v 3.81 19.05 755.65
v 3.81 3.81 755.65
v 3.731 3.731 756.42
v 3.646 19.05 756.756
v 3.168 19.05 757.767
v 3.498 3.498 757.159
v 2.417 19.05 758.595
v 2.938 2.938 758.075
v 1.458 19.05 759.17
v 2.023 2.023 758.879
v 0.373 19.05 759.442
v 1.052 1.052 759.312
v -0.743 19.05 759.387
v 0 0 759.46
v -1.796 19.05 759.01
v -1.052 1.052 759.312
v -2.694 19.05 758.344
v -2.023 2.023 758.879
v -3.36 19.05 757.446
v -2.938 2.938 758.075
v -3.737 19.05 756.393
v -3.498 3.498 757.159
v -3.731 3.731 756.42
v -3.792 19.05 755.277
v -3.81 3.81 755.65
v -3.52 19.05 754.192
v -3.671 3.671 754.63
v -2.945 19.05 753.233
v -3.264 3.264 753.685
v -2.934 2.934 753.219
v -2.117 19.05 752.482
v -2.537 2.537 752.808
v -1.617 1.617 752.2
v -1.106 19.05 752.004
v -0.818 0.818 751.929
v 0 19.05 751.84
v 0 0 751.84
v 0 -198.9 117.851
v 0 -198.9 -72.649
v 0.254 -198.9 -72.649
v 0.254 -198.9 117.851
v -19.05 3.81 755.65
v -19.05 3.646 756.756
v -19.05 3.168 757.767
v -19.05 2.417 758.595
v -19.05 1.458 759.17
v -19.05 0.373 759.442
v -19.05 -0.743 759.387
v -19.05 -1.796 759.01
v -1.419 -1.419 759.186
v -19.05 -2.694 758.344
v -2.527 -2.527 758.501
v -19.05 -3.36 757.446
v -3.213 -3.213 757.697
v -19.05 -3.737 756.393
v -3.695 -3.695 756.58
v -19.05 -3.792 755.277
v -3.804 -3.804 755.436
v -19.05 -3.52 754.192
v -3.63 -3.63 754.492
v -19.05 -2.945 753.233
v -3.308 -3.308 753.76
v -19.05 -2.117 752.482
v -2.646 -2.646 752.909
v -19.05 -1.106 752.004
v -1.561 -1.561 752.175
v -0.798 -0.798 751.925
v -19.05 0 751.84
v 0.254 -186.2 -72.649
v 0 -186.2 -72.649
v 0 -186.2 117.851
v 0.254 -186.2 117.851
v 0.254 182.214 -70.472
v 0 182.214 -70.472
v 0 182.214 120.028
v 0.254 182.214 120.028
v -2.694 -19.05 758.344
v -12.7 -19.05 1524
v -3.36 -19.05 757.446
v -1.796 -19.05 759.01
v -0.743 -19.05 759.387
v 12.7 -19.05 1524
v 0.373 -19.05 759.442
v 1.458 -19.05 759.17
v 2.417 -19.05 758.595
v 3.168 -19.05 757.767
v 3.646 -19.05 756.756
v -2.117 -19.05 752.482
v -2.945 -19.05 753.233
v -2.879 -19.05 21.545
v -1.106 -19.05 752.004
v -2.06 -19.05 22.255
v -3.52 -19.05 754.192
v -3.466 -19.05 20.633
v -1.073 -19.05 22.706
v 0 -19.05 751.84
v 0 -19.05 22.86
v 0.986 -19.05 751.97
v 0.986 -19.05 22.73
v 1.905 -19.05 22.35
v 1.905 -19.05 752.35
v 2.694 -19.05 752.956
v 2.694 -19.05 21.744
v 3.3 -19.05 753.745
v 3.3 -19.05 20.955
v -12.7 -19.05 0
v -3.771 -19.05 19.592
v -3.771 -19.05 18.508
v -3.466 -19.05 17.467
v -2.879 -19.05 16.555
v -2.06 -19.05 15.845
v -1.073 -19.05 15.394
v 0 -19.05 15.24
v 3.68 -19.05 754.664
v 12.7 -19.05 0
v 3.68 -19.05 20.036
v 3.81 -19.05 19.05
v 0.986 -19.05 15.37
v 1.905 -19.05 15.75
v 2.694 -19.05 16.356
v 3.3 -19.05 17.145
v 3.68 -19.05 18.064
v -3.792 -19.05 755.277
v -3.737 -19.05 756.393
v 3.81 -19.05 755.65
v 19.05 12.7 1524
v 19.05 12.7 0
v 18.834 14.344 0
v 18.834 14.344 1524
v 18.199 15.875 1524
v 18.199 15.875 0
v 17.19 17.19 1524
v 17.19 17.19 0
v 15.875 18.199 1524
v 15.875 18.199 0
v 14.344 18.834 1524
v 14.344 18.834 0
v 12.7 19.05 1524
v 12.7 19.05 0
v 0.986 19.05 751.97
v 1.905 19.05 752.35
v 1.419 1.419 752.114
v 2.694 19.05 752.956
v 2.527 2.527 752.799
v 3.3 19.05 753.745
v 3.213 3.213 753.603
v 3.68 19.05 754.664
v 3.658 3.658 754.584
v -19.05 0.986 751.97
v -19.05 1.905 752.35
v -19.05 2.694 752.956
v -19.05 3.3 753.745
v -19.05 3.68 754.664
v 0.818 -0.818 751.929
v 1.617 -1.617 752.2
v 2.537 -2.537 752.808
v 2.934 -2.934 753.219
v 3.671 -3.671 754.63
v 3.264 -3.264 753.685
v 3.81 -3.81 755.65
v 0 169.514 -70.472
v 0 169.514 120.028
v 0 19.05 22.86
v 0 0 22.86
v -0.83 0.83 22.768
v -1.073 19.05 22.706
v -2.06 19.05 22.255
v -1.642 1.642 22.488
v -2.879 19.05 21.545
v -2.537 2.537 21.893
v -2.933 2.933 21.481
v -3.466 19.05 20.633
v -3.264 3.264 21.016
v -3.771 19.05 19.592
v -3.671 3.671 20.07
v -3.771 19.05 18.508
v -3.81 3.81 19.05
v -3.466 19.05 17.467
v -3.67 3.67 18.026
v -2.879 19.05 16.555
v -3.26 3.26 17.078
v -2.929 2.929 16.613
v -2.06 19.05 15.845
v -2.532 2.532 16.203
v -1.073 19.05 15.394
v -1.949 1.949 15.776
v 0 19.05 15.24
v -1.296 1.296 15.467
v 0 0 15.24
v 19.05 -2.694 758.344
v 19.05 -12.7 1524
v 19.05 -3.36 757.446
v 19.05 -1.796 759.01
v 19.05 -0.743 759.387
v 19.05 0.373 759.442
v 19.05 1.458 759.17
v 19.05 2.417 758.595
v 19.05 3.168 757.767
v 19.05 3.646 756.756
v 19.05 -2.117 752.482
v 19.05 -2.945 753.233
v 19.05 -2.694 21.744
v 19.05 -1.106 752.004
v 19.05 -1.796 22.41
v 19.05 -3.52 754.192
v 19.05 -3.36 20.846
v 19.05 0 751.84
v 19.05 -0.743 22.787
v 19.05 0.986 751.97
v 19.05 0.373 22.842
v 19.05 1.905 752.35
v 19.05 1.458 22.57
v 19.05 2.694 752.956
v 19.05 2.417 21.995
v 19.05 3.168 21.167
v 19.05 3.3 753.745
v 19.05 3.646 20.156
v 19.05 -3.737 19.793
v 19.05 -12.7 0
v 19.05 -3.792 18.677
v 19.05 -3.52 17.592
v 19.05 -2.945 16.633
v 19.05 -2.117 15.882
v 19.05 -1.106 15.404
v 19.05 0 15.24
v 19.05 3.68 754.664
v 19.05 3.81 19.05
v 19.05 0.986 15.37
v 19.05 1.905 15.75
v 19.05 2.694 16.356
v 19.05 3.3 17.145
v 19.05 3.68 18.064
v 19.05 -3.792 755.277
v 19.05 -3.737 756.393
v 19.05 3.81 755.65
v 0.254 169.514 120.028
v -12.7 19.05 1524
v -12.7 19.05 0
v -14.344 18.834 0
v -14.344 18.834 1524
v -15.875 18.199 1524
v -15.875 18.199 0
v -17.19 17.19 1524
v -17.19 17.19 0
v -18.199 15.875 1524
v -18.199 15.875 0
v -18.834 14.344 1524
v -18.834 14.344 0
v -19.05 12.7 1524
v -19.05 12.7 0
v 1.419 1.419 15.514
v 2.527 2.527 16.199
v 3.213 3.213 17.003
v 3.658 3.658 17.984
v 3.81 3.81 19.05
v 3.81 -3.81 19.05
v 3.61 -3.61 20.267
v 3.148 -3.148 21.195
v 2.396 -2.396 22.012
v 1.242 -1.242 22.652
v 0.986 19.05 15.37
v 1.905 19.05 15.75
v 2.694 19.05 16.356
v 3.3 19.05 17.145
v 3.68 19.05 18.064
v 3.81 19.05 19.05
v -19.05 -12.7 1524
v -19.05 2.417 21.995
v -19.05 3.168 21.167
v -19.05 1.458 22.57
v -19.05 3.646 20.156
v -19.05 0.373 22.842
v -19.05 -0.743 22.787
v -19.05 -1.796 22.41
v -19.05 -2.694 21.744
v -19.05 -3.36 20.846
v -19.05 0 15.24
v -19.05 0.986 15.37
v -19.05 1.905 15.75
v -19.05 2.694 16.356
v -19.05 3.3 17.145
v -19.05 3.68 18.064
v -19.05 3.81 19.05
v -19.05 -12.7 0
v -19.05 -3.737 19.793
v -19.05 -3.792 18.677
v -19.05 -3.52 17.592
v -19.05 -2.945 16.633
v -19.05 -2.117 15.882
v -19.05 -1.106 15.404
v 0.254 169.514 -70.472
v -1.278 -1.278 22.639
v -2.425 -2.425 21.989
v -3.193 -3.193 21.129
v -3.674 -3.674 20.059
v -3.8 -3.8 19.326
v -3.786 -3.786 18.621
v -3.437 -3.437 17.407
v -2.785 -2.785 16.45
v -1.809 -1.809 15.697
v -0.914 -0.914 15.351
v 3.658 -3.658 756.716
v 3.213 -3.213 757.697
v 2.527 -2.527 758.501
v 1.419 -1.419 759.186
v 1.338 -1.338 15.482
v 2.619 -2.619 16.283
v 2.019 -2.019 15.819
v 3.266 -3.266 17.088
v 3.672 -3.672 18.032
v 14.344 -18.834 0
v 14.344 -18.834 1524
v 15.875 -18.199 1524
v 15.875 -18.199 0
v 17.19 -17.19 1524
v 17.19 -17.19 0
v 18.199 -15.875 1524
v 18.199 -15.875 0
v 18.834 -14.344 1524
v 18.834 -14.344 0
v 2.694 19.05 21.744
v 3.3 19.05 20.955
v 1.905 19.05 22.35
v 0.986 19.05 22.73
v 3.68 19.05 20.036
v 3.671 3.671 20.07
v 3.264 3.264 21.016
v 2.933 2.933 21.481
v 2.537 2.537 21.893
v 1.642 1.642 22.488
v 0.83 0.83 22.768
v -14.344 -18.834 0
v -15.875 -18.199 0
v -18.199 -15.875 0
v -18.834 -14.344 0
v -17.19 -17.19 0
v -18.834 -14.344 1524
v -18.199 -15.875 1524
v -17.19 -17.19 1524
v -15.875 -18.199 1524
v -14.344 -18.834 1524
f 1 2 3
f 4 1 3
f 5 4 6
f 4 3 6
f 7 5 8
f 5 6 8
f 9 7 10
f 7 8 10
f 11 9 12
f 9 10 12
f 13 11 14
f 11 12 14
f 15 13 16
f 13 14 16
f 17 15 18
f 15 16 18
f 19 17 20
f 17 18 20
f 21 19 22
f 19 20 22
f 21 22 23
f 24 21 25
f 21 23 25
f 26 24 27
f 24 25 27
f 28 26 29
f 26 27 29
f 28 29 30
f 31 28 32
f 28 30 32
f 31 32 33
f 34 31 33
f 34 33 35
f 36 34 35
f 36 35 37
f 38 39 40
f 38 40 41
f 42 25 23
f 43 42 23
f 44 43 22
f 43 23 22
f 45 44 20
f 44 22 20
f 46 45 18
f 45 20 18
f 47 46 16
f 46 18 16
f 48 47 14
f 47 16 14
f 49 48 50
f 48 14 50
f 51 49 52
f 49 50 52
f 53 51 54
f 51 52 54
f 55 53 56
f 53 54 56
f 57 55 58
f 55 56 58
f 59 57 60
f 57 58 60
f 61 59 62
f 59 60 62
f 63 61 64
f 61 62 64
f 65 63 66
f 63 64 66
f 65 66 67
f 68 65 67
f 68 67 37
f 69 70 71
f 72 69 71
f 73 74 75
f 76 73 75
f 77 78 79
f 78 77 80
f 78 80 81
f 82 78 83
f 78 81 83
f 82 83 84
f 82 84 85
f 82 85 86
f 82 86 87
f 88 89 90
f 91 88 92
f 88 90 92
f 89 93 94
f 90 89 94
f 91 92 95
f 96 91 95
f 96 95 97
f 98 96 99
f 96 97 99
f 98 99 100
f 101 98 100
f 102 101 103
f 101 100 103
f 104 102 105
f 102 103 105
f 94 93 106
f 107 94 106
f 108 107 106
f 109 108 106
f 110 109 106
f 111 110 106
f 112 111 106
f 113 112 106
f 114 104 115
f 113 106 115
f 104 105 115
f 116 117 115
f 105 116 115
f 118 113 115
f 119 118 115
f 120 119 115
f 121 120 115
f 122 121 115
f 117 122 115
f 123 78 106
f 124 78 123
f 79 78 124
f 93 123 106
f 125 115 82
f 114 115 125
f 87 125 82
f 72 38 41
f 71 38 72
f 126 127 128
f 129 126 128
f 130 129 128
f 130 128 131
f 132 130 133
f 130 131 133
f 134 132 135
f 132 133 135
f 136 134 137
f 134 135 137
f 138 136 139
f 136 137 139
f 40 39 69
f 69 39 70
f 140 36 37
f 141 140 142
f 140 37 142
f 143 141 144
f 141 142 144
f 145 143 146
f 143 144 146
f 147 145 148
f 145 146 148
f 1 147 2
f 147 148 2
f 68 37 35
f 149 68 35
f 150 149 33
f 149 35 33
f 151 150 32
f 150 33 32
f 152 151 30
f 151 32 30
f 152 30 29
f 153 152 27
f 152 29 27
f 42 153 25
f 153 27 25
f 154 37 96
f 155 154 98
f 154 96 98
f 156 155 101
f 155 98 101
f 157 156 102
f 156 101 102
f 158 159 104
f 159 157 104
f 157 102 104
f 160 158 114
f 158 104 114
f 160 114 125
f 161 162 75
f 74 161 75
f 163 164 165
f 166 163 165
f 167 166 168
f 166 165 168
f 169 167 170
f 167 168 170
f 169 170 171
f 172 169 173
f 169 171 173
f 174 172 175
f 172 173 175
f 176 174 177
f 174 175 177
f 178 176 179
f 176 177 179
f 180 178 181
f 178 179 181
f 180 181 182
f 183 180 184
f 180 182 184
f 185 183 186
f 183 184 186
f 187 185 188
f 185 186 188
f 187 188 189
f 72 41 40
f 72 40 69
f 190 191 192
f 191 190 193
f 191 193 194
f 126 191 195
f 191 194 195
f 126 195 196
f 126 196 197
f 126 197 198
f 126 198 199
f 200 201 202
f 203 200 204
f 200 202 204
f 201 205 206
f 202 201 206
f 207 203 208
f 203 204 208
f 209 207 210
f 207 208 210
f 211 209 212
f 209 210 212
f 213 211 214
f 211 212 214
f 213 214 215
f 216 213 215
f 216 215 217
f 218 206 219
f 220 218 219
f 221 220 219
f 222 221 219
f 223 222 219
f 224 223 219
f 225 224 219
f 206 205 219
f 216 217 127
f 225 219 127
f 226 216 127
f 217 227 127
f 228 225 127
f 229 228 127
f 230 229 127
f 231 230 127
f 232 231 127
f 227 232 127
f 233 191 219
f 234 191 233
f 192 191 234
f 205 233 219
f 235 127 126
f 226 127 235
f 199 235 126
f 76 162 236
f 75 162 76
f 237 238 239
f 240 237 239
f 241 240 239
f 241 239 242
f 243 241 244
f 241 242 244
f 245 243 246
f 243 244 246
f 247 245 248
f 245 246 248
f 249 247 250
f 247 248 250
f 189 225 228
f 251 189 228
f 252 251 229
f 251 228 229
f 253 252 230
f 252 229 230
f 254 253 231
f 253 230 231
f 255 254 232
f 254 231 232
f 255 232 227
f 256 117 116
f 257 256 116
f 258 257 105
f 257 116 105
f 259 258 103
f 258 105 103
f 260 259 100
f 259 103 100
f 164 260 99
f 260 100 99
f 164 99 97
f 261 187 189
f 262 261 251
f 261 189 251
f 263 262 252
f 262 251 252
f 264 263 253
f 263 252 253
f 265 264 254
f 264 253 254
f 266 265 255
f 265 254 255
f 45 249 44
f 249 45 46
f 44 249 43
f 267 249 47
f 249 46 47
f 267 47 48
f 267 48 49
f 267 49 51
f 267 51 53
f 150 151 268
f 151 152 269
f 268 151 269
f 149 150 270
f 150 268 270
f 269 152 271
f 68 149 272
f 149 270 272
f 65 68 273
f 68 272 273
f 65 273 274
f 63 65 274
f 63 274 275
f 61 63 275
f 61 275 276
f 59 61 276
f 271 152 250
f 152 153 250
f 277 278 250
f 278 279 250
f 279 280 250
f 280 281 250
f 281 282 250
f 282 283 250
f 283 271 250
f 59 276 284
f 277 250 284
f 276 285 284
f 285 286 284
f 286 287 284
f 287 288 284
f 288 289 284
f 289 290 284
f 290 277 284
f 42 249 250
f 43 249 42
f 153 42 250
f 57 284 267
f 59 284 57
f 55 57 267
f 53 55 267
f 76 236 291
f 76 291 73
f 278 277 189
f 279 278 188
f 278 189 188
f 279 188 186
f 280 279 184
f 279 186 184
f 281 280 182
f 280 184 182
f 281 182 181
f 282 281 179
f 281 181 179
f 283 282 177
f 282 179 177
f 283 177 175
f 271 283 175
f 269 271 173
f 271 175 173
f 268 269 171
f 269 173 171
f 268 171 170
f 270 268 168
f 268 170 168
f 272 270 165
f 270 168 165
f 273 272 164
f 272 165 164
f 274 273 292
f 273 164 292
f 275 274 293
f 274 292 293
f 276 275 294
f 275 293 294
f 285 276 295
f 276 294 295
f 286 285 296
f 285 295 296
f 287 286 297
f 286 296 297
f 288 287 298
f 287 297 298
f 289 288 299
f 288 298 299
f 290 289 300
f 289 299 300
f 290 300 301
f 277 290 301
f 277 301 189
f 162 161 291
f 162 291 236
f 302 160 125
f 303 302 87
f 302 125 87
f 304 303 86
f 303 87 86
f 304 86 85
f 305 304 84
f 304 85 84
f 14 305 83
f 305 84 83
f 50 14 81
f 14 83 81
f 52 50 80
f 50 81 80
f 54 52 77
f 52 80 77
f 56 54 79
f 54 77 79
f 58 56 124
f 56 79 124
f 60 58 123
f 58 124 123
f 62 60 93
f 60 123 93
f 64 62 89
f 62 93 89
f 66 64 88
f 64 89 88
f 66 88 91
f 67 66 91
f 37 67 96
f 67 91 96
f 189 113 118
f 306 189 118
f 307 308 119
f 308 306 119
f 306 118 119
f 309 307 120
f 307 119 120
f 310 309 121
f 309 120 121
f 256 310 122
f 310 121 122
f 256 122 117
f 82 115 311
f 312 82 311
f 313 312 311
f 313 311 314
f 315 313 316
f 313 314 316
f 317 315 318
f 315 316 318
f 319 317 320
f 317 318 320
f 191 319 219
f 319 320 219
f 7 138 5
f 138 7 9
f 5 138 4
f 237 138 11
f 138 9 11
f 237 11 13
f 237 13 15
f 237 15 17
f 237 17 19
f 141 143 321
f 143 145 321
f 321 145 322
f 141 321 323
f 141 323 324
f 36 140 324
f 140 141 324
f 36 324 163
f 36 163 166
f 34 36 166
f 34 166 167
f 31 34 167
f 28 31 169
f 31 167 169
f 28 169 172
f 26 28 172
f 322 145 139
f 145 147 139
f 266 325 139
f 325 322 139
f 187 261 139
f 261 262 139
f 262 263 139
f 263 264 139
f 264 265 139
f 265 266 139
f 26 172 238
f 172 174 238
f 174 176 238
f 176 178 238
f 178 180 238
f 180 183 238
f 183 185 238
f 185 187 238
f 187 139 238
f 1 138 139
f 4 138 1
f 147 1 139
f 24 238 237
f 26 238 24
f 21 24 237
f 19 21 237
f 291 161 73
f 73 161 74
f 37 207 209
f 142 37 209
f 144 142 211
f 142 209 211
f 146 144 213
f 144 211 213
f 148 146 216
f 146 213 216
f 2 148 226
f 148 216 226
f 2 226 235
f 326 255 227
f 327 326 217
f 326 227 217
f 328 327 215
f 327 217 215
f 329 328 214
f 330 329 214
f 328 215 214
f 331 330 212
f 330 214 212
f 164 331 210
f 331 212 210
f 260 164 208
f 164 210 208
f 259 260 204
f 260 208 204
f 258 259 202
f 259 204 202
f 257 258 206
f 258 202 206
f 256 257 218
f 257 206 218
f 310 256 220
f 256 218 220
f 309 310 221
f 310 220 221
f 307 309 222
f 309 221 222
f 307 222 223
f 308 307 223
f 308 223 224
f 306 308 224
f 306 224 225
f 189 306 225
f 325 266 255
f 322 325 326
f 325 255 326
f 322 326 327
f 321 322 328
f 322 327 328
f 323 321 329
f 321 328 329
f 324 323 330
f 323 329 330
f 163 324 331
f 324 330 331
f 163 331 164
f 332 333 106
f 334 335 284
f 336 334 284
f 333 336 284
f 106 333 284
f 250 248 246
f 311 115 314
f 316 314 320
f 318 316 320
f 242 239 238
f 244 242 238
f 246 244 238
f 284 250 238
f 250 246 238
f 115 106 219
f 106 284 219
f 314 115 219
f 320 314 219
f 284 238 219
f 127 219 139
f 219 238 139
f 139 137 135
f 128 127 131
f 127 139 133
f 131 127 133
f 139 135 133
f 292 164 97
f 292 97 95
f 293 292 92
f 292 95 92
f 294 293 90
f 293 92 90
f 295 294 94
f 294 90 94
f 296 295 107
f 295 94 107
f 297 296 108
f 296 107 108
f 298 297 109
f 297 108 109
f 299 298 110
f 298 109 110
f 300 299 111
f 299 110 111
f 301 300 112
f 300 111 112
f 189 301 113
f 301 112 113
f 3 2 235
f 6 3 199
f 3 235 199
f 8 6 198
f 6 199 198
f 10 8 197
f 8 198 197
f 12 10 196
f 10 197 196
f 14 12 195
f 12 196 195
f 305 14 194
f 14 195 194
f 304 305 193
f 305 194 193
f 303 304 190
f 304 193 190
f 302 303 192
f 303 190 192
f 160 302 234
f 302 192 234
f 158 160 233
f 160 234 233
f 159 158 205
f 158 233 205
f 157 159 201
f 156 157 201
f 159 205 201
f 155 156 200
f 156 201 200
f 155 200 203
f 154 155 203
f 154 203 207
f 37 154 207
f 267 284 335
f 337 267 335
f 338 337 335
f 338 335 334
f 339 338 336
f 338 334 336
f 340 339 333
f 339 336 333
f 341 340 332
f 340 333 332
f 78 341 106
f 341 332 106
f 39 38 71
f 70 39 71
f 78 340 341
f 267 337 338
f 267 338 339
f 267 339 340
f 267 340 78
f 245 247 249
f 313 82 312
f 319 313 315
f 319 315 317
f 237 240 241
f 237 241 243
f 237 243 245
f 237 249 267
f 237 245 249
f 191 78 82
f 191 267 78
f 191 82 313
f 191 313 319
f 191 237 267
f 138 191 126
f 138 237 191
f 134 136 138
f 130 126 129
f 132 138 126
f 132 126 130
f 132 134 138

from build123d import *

# Parameters (mm, degrees)
F1_DEPTH  = 1524
F2_W      = 12.7
F2_H      = 190.5
F4_DEPTH  = 0.254
F3_W      = 12.7
F3_H      = 190.5
F5_DEPTH  = 0.254
F7_DEPTH  = 38.1
F9_DEPTH  = 38.1
F10_DEPTH = 38.1
F12_DEPTH = 38.1


with BuildPart() as f1:
    # F0 (on Top) → F1 (new body)
    with BuildSketch(Plane.XY):
        with BuildLine():
            ThreePointArc((19.05, 12.7), (17.1901280605, 17.1901280605), (12.7, 19.05))
            Line((12.7, 19.05), (-12.7, 19.05))
            ThreePointArc((-12.7, 19.05), (-17.1901280605, 17.1901280605), (-19.05, 12.7))
            Line((-19.05, 12.7), (-19.05, -12.7))
            ThreePointArc((-19.05, -12.7), (-17.1901280605, -17.1901280605), (-12.7, -19.05))
            Line((-12.7, -19.05), (12.7, -19.05))
            ThreePointArc((12.7, -19.05), (17.1901280605, -17.1901280605), (19.05, -12.7))
            Line((19.05, -12.7), (19.05, 12.7))
        make_face()
    extrude(amount=F1_DEPTH)

    # F6 (on face) → F7 (cut)
    with BuildSketch(Plane.YZ.offset(19.05)):
        with BuildLine():
            ThreePointArc((0, 751.84), (2.6940768363, 752.9559231637), (3.81, 755.65))
            ThreePointArc((3.81, 755.65), (-2.6940768363, 758.3440768363), (0, 751.84))
        make_face()
    extrude(amount=-F7_DEPTH, mode=Mode.SUBTRACT)

    # F8 (on face) → F9 (cut)
    with BuildSketch(Plane.XZ.offset(19.05)):
        with BuildLine():
            ThreePointArc((0, 22.86), (-3.81, 19.05), (0, 15.24))
            Line((0, 15.24), (0, 19.05))
            Line((0, 19.05), (0, 22.86))
        make_face()
        with BuildLine():
            ThreePointArc((3.81, 755.65), (-2.6940768363, 758.3440768363), (0, 751.84))
            ThreePointArc((0, 751.84), (2.6940768363, 752.9559231637), (3.81, 755.65))
        make_face()
        with BuildLine():
            Line((0, 19.05), (0, 15.24))
            ThreePointArc((0, 15.24), (2.6940768363, 16.3559231637), (3.81, 19.05))
            ThreePointArc((3.81, 19.05), (2.6940768363, 21.7440768363), (0, 22.86))
            Line((0, 22.86), (0, 19.05))
        make_face()
    extrude(amount=-F9_DEPTH, mode=Mode.SUBTRACT)

    # F8 (on face) → F10 (cut)
    with BuildSketch(Plane.XZ.offset(19.05)):
        with BuildLine():
            ThreePointArc((0, 22.86), (-3.81, 19.05), (0, 15.24))
            Line((0, 15.24), (0, 19.05))
            Line((0, 19.05), (0, 22.86))
        make_face()
        with BuildLine():
            ThreePointArc((3.81, 755.65), (-2.6940768363, 758.3440768363), (0, 751.84))
            ThreePointArc((0, 751.84), (2.6940768363, 752.9559231637), (3.81, 755.65))
        make_face()
        with BuildLine():
            Line((0, 19.05), (0, 15.24))
            ThreePointArc((0, 15.24), (2.6940768363, 16.3559231637), (3.81, 19.05))
            ThreePointArc((3.81, 19.05), (2.6940768363, 21.7440768363), (0, 22.86))
            Line((0, 22.86), (0, 19.05))
        make_face()
    extrude(amount=-F10_DEPTH, mode=Mode.SUBTRACT)

    # F11 (on face) → F12 (cut)
    with BuildSketch(Plane.YZ.offset(19.05)):
        with BuildLine():
            ThreePointArc((0, 15.24), (2.6940768363, 16.3559231637), (3.81, 19.05))
            ThreePointArc((3.81, 19.05), (-2.6940768363, 21.7440768363), (0, 15.24))
        make_face()
    extrude(amount=-F12_DEPTH, mode=Mode.SUBTRACT)


with BuildPart() as f4:
    # F2 (on Right) → F4 (new body)
    with BuildSketch(Plane.YZ):
        with Locations((-192.550282383, 22.60106498)):
            Rectangle(F2_W, F2_H)
    extrude(amount=F4_DEPTH)


with BuildPart() as f5:
    # F3 (on Right) → F5 (new body)
    with BuildSketch(Plane.YZ):
        with Locations((175.8641792297, 24.7778154314)):
            Rectangle(F3_W, F3_H)
    extrude(amount=F5_DEPTH)


solid = Compound([f1.part, f4.part, f5.part])
